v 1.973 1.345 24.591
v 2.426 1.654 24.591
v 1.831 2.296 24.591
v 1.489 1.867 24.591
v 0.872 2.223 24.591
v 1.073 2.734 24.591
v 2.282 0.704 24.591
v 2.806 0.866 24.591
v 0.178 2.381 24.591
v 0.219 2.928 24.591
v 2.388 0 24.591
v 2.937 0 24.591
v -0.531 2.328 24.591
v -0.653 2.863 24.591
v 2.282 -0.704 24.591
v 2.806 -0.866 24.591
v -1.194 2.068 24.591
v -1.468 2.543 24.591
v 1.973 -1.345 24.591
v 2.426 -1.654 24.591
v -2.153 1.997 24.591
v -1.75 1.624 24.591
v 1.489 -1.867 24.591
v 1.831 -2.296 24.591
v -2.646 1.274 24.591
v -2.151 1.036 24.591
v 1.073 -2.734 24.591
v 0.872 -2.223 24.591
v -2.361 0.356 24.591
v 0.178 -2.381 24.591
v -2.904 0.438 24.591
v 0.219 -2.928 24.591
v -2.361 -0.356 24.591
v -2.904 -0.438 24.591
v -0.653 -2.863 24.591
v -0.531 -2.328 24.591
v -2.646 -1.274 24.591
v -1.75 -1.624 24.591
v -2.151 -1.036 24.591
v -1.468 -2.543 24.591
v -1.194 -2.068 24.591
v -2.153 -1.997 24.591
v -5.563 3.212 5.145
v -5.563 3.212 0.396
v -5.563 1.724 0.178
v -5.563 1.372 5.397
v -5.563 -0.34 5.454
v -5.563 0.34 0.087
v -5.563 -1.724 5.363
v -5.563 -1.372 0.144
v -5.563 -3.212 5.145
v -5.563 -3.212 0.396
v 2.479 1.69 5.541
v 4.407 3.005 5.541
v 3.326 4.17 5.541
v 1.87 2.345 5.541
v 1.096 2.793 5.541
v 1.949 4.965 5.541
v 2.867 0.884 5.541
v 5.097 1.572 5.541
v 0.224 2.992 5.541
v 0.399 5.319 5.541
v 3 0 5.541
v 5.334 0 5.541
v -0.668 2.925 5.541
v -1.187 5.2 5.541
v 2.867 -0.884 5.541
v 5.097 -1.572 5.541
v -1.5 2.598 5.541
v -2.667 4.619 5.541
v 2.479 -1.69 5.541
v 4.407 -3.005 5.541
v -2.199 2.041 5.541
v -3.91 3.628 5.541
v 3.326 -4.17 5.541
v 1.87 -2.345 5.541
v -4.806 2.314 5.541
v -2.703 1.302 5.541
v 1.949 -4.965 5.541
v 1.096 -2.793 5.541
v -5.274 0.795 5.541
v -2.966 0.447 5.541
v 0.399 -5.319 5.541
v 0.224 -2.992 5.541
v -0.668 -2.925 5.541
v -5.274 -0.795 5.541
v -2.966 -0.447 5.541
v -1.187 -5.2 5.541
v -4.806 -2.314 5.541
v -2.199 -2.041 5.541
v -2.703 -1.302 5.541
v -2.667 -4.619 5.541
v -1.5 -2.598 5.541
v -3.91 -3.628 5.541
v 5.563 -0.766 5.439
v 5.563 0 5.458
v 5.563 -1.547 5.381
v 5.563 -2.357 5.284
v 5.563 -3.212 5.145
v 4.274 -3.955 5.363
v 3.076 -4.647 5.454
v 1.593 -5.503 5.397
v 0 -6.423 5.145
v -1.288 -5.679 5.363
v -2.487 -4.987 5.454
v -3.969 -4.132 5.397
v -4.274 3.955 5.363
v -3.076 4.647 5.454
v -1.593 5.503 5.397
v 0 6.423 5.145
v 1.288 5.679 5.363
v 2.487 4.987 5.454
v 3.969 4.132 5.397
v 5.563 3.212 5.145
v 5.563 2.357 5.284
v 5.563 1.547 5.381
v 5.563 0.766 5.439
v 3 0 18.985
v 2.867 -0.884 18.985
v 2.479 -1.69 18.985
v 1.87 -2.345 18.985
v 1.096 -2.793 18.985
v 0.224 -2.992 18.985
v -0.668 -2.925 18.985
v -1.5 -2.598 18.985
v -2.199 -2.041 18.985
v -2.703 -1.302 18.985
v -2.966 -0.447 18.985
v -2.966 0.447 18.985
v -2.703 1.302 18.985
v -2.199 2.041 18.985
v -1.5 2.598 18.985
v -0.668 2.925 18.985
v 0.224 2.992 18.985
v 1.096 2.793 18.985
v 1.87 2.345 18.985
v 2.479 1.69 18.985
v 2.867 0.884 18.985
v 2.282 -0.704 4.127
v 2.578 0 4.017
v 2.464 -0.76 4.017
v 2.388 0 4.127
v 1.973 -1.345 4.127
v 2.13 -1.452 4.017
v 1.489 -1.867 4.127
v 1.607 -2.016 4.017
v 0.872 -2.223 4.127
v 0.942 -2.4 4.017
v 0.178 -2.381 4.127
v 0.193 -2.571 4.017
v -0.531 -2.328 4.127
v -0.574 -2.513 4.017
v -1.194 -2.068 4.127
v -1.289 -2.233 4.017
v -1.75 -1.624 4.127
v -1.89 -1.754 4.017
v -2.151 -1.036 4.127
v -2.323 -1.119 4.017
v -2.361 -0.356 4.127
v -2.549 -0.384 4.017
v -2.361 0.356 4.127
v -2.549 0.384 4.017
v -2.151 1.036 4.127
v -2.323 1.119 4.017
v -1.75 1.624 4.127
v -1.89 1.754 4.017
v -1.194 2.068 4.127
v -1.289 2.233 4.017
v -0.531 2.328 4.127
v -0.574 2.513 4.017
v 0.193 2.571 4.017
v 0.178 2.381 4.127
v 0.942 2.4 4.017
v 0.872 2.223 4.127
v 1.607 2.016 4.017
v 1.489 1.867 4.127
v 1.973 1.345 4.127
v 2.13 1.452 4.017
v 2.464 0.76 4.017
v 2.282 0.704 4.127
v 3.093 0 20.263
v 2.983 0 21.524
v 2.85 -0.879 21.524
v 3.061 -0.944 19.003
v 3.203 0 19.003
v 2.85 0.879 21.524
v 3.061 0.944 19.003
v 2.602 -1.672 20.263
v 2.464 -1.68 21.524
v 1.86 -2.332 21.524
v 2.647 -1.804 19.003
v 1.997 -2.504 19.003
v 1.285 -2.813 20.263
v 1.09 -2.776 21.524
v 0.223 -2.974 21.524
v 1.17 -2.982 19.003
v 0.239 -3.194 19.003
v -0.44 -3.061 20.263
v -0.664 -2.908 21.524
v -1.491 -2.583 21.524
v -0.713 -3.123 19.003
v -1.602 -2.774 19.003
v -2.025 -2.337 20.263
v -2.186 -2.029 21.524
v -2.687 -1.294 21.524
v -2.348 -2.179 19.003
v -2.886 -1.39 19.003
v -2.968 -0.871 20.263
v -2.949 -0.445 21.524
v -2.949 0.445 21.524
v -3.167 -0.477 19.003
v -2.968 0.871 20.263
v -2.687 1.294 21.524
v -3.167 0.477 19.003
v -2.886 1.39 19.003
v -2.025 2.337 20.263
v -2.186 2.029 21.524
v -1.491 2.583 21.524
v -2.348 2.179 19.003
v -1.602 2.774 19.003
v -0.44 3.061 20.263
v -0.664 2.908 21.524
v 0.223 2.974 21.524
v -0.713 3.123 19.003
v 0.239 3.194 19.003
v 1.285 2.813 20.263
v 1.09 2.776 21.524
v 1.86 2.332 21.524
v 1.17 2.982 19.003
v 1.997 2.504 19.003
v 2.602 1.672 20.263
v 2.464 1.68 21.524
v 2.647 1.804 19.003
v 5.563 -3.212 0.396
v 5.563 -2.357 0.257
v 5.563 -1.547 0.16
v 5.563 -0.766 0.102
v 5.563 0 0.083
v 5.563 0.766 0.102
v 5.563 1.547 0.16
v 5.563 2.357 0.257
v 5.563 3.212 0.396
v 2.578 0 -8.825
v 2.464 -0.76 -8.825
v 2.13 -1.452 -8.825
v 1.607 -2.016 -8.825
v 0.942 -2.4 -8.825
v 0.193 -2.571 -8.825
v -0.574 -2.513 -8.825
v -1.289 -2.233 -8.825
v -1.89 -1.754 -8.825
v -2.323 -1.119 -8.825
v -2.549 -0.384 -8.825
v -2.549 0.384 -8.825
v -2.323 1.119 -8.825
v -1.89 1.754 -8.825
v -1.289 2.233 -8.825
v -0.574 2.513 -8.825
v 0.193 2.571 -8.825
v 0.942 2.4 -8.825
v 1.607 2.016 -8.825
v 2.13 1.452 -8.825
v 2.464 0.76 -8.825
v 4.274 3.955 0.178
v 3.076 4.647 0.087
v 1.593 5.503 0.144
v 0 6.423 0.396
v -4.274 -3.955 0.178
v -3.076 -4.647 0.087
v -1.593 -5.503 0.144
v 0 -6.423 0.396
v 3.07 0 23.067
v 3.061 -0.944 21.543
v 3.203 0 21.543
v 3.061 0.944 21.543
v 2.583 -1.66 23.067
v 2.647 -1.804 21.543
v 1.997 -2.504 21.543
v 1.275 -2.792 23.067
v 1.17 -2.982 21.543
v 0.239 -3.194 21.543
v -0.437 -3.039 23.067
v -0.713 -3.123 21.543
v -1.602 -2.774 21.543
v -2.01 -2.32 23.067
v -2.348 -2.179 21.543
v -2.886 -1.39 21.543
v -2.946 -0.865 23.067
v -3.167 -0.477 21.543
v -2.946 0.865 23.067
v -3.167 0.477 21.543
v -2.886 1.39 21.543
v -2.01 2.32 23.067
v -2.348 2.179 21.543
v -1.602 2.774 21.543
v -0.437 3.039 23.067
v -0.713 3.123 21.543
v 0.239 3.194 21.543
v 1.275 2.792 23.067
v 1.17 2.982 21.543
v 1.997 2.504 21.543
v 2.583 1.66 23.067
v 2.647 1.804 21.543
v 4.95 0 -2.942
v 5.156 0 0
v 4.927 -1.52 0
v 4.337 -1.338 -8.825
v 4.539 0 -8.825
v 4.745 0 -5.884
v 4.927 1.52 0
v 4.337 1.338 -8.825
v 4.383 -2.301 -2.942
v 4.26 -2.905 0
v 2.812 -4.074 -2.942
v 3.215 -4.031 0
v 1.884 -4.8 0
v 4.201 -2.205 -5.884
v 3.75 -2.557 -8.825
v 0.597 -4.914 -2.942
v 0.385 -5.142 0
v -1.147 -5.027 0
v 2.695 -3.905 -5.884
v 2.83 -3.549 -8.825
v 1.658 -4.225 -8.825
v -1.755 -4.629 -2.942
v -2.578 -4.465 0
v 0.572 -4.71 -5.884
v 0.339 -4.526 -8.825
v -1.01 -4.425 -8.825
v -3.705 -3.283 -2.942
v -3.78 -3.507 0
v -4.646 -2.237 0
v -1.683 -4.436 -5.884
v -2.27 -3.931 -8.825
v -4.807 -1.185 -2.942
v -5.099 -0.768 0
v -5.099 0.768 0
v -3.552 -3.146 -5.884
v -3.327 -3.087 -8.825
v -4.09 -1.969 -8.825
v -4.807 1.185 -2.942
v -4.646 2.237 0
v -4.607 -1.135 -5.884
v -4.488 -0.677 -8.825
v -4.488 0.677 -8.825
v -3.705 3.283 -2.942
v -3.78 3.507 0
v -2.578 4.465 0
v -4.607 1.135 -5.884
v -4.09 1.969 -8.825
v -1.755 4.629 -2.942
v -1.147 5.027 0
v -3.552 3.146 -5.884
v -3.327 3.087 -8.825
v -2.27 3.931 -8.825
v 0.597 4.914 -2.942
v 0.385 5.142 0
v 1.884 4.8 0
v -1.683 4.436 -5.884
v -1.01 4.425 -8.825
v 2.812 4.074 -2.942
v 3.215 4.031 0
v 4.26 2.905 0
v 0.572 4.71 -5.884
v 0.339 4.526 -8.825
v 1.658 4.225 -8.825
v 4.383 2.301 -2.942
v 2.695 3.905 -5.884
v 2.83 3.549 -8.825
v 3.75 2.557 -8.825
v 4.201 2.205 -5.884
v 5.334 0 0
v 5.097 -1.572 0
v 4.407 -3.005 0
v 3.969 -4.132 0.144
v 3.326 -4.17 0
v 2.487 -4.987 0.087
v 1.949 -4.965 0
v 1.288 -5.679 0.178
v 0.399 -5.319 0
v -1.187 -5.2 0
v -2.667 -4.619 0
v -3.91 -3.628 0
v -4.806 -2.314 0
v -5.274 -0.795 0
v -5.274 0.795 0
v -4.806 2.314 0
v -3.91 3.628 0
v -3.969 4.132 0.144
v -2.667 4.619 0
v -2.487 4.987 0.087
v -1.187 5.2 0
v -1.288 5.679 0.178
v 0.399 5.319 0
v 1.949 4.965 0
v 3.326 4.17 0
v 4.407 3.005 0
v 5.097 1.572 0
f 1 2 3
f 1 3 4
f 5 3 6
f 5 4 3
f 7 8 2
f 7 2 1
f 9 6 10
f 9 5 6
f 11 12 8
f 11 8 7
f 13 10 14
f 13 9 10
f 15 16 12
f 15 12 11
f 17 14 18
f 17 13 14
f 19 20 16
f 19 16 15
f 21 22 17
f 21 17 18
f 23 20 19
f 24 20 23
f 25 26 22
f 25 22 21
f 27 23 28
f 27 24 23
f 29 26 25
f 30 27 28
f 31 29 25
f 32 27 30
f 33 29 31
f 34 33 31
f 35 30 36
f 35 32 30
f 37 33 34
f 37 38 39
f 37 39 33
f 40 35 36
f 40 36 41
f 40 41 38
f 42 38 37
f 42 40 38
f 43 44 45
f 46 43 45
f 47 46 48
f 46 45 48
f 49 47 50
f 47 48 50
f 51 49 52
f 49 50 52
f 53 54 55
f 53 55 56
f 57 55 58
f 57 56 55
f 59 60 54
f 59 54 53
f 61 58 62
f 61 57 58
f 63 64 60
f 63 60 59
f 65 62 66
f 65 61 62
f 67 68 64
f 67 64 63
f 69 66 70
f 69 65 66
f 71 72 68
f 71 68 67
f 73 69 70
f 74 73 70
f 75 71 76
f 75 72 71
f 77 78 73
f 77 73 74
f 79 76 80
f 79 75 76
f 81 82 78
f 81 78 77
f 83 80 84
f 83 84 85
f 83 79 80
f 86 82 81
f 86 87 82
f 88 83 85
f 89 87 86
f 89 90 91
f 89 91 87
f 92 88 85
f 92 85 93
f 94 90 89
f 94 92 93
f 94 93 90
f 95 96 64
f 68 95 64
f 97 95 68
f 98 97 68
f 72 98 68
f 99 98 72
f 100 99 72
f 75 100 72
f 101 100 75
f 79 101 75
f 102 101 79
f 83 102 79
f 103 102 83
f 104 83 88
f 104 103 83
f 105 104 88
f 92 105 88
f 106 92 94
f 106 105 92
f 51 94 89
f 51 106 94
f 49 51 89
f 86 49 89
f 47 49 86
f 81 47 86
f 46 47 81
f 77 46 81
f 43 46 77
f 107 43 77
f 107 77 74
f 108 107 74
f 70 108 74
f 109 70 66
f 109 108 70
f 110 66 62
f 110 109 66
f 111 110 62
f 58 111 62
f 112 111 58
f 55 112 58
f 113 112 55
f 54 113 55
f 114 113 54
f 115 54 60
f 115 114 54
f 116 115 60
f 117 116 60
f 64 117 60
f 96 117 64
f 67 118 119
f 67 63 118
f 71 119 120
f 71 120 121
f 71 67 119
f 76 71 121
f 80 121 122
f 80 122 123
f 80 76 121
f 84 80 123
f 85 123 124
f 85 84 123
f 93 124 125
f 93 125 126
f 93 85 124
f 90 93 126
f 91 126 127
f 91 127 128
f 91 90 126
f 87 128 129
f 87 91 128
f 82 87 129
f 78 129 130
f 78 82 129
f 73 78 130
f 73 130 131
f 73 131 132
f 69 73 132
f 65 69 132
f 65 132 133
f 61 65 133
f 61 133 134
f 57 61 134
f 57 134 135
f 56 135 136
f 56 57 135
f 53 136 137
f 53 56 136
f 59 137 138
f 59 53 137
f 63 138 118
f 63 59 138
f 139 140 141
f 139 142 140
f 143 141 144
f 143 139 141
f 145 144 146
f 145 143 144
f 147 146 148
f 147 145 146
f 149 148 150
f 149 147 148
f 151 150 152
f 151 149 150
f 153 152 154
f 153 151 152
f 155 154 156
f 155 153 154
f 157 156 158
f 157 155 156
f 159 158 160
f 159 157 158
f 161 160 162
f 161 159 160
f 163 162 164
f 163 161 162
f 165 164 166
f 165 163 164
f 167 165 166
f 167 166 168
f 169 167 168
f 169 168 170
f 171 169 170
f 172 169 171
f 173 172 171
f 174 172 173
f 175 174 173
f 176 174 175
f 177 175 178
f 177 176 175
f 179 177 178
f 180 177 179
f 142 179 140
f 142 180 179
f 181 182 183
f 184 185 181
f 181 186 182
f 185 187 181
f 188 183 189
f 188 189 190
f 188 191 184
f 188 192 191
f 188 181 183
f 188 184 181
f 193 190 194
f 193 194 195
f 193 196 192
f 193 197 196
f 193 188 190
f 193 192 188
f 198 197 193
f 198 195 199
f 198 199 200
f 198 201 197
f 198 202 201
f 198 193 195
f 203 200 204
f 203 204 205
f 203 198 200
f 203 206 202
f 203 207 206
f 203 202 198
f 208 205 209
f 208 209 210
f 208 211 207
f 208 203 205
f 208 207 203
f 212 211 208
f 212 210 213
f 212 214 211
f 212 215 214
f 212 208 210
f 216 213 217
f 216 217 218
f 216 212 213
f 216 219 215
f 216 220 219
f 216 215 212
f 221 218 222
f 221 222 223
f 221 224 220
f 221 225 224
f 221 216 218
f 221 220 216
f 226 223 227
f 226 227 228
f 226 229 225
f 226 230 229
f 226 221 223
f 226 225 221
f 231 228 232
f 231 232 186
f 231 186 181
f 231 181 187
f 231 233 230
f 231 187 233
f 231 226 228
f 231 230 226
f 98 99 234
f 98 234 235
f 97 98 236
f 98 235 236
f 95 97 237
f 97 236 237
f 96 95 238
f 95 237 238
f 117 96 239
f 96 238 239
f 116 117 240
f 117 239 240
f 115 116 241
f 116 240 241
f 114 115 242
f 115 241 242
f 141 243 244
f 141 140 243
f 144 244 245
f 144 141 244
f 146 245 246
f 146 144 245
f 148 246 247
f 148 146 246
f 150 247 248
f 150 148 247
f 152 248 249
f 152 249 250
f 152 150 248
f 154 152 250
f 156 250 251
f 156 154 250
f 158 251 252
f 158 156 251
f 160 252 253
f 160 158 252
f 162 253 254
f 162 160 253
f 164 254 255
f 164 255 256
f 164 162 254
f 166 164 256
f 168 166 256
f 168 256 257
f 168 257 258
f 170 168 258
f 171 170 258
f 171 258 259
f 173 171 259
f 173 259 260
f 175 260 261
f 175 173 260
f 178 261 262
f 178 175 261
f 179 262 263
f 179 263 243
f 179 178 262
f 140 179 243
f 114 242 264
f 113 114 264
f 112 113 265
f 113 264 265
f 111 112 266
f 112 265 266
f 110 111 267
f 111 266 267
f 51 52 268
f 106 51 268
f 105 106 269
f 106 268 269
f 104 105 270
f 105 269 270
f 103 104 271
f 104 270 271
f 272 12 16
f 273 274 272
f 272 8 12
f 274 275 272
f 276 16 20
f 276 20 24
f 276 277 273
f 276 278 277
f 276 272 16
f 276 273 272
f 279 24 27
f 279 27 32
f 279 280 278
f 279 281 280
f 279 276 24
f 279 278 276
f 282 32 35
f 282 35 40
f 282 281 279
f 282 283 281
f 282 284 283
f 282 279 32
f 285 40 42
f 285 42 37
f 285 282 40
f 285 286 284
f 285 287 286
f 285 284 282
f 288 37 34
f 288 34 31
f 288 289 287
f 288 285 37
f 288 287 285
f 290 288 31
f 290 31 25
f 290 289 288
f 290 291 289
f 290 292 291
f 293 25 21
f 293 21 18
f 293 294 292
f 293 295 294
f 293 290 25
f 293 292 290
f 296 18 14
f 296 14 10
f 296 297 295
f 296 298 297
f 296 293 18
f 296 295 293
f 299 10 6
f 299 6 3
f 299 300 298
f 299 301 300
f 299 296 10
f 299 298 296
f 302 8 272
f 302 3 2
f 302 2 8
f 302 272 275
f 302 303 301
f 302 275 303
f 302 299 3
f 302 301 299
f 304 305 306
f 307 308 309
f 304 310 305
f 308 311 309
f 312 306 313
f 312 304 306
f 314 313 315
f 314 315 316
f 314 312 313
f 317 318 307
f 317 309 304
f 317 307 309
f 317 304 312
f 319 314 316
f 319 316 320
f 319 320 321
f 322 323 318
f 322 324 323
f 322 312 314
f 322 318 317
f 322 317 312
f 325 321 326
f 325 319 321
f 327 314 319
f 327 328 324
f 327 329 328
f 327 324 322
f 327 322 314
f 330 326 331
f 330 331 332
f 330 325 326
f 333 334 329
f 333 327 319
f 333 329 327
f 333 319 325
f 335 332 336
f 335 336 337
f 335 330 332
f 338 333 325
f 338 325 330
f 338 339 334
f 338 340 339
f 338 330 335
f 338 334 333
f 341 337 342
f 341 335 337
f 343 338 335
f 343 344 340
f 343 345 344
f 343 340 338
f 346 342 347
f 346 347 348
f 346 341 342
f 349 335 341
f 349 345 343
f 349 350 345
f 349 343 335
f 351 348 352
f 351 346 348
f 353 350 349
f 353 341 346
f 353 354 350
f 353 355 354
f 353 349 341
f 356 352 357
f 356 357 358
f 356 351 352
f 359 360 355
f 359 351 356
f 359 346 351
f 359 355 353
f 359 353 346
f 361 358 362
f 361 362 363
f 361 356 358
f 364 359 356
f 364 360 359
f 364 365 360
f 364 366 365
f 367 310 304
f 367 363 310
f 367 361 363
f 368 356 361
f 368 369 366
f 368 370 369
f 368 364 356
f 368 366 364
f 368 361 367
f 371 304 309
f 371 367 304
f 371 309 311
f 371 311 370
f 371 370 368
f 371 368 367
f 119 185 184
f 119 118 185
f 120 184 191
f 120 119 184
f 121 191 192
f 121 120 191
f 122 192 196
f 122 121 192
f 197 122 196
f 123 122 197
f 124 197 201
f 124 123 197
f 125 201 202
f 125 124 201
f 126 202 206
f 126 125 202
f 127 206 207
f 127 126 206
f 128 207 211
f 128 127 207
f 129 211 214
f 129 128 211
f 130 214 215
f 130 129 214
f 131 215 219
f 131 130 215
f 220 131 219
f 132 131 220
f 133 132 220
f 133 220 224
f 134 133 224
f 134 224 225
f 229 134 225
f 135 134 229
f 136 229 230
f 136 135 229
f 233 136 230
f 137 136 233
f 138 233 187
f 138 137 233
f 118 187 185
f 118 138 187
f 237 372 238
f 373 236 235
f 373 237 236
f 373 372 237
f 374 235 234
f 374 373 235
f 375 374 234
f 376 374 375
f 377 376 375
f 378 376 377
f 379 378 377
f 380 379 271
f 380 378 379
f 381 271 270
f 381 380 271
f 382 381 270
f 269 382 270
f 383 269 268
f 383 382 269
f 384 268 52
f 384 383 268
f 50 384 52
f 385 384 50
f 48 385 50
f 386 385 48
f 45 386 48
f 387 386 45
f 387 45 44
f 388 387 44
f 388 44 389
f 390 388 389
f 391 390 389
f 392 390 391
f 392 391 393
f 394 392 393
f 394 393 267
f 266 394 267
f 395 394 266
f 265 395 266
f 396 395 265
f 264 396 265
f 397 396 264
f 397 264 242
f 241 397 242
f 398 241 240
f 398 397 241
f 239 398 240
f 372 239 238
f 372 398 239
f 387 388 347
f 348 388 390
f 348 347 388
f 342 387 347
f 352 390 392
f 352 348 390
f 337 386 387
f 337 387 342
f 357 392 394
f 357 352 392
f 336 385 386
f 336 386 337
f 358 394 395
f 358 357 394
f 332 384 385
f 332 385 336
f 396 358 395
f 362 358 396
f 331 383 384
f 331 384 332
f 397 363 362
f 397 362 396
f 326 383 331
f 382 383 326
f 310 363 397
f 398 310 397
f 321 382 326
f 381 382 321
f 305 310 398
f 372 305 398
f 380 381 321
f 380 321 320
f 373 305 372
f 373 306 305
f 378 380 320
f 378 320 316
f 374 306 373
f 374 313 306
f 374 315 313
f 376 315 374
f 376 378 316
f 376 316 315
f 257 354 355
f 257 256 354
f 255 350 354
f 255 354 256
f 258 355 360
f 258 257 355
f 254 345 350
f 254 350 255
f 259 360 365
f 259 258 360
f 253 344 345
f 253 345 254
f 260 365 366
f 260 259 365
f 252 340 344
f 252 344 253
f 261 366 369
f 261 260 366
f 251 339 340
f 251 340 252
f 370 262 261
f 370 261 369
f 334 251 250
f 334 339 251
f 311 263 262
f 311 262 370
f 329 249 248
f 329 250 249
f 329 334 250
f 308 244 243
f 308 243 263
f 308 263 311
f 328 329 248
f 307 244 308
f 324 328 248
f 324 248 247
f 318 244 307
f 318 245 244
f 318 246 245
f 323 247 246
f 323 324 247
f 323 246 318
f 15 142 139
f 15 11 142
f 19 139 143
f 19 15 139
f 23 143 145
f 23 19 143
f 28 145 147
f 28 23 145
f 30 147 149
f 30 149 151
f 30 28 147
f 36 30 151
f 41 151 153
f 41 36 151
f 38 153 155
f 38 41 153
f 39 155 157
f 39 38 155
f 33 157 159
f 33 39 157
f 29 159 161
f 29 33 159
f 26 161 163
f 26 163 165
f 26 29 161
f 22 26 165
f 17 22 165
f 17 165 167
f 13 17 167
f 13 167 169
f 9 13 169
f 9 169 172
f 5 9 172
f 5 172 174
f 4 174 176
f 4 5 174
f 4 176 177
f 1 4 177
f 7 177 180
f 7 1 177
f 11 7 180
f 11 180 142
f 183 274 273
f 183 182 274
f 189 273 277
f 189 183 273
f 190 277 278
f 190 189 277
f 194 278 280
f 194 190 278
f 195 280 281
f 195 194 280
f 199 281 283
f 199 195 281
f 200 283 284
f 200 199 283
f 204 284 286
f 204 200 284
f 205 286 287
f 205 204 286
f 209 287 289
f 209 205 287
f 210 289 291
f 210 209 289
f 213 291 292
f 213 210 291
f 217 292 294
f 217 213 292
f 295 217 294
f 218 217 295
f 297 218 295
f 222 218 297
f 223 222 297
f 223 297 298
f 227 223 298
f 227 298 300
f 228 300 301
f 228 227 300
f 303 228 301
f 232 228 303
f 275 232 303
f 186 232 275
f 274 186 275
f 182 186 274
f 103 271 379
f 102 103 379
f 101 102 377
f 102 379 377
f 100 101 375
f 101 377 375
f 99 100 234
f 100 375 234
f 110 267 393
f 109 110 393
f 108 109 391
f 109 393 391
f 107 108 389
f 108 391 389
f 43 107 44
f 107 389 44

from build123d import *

# Parameters (mm, degrees)
SKETCH2_OUTSIDE_W  = 25.78
SKETCH2_OUTSIDE_H  = 25.78
CUT_EXTRUDE1_DEPTH = 27.994890987


with BuildPart() as part:
    # Sketch1 → Revolve1 (revolve)
    with BuildSketch(Plane(origin=(0, 0, 0), x_dir=(0, 0, -1), z_dir=(1, 0, 0)), mode=Mode.PRIVATE) as revolve1_sk:
        Polygon((-4.127129718, 2.3876), (-24.591144492, 2.3876), (-24.591144492, 2.936534554), (-21.543144492, 3.2032), (-21.523850338, 2.982666814), (-19.003144492, 3.2032), (-18.985366795, 3), (-5.541144492, 3), (-5.541144492, 5.334), (-4.616660097, 7.874), (-0.924484395, 7.874), (0, 5.334), (0, 5.1562), (8.825478894, 4.539062397), (8.825478894, 2.5781), (-4.017144492, 2.5781), align=None)
    revolve(revolve1_sk.sketch.rotate(Axis((0, 0, -2.001994087), (0, 0, -1)), 90), axis=Axis((0, 0, -2.001994087), (0, 0, -1)))

    # Sketch2 outside → Cut-Extrude1 (cut, through all)
    with BuildSketch(Plane.XY):
        Rectangle(SKETCH2_OUTSIDE_W, SKETCH2_OUTSIDE_H)
        Polygon((0, 6.423137215), (-5.5626, 3.211568607), (-5.5626, -3.211568607), (0, -6.423137215), (5.5626, -3.211568607), (5.5626, 3.211568607), align=None, mode=Mode.SUBTRACT)
    extrude(amount=CUT_EXTRUDE1_DEPTH, mode=Mode.SUBTRACT)


solid = part.part
